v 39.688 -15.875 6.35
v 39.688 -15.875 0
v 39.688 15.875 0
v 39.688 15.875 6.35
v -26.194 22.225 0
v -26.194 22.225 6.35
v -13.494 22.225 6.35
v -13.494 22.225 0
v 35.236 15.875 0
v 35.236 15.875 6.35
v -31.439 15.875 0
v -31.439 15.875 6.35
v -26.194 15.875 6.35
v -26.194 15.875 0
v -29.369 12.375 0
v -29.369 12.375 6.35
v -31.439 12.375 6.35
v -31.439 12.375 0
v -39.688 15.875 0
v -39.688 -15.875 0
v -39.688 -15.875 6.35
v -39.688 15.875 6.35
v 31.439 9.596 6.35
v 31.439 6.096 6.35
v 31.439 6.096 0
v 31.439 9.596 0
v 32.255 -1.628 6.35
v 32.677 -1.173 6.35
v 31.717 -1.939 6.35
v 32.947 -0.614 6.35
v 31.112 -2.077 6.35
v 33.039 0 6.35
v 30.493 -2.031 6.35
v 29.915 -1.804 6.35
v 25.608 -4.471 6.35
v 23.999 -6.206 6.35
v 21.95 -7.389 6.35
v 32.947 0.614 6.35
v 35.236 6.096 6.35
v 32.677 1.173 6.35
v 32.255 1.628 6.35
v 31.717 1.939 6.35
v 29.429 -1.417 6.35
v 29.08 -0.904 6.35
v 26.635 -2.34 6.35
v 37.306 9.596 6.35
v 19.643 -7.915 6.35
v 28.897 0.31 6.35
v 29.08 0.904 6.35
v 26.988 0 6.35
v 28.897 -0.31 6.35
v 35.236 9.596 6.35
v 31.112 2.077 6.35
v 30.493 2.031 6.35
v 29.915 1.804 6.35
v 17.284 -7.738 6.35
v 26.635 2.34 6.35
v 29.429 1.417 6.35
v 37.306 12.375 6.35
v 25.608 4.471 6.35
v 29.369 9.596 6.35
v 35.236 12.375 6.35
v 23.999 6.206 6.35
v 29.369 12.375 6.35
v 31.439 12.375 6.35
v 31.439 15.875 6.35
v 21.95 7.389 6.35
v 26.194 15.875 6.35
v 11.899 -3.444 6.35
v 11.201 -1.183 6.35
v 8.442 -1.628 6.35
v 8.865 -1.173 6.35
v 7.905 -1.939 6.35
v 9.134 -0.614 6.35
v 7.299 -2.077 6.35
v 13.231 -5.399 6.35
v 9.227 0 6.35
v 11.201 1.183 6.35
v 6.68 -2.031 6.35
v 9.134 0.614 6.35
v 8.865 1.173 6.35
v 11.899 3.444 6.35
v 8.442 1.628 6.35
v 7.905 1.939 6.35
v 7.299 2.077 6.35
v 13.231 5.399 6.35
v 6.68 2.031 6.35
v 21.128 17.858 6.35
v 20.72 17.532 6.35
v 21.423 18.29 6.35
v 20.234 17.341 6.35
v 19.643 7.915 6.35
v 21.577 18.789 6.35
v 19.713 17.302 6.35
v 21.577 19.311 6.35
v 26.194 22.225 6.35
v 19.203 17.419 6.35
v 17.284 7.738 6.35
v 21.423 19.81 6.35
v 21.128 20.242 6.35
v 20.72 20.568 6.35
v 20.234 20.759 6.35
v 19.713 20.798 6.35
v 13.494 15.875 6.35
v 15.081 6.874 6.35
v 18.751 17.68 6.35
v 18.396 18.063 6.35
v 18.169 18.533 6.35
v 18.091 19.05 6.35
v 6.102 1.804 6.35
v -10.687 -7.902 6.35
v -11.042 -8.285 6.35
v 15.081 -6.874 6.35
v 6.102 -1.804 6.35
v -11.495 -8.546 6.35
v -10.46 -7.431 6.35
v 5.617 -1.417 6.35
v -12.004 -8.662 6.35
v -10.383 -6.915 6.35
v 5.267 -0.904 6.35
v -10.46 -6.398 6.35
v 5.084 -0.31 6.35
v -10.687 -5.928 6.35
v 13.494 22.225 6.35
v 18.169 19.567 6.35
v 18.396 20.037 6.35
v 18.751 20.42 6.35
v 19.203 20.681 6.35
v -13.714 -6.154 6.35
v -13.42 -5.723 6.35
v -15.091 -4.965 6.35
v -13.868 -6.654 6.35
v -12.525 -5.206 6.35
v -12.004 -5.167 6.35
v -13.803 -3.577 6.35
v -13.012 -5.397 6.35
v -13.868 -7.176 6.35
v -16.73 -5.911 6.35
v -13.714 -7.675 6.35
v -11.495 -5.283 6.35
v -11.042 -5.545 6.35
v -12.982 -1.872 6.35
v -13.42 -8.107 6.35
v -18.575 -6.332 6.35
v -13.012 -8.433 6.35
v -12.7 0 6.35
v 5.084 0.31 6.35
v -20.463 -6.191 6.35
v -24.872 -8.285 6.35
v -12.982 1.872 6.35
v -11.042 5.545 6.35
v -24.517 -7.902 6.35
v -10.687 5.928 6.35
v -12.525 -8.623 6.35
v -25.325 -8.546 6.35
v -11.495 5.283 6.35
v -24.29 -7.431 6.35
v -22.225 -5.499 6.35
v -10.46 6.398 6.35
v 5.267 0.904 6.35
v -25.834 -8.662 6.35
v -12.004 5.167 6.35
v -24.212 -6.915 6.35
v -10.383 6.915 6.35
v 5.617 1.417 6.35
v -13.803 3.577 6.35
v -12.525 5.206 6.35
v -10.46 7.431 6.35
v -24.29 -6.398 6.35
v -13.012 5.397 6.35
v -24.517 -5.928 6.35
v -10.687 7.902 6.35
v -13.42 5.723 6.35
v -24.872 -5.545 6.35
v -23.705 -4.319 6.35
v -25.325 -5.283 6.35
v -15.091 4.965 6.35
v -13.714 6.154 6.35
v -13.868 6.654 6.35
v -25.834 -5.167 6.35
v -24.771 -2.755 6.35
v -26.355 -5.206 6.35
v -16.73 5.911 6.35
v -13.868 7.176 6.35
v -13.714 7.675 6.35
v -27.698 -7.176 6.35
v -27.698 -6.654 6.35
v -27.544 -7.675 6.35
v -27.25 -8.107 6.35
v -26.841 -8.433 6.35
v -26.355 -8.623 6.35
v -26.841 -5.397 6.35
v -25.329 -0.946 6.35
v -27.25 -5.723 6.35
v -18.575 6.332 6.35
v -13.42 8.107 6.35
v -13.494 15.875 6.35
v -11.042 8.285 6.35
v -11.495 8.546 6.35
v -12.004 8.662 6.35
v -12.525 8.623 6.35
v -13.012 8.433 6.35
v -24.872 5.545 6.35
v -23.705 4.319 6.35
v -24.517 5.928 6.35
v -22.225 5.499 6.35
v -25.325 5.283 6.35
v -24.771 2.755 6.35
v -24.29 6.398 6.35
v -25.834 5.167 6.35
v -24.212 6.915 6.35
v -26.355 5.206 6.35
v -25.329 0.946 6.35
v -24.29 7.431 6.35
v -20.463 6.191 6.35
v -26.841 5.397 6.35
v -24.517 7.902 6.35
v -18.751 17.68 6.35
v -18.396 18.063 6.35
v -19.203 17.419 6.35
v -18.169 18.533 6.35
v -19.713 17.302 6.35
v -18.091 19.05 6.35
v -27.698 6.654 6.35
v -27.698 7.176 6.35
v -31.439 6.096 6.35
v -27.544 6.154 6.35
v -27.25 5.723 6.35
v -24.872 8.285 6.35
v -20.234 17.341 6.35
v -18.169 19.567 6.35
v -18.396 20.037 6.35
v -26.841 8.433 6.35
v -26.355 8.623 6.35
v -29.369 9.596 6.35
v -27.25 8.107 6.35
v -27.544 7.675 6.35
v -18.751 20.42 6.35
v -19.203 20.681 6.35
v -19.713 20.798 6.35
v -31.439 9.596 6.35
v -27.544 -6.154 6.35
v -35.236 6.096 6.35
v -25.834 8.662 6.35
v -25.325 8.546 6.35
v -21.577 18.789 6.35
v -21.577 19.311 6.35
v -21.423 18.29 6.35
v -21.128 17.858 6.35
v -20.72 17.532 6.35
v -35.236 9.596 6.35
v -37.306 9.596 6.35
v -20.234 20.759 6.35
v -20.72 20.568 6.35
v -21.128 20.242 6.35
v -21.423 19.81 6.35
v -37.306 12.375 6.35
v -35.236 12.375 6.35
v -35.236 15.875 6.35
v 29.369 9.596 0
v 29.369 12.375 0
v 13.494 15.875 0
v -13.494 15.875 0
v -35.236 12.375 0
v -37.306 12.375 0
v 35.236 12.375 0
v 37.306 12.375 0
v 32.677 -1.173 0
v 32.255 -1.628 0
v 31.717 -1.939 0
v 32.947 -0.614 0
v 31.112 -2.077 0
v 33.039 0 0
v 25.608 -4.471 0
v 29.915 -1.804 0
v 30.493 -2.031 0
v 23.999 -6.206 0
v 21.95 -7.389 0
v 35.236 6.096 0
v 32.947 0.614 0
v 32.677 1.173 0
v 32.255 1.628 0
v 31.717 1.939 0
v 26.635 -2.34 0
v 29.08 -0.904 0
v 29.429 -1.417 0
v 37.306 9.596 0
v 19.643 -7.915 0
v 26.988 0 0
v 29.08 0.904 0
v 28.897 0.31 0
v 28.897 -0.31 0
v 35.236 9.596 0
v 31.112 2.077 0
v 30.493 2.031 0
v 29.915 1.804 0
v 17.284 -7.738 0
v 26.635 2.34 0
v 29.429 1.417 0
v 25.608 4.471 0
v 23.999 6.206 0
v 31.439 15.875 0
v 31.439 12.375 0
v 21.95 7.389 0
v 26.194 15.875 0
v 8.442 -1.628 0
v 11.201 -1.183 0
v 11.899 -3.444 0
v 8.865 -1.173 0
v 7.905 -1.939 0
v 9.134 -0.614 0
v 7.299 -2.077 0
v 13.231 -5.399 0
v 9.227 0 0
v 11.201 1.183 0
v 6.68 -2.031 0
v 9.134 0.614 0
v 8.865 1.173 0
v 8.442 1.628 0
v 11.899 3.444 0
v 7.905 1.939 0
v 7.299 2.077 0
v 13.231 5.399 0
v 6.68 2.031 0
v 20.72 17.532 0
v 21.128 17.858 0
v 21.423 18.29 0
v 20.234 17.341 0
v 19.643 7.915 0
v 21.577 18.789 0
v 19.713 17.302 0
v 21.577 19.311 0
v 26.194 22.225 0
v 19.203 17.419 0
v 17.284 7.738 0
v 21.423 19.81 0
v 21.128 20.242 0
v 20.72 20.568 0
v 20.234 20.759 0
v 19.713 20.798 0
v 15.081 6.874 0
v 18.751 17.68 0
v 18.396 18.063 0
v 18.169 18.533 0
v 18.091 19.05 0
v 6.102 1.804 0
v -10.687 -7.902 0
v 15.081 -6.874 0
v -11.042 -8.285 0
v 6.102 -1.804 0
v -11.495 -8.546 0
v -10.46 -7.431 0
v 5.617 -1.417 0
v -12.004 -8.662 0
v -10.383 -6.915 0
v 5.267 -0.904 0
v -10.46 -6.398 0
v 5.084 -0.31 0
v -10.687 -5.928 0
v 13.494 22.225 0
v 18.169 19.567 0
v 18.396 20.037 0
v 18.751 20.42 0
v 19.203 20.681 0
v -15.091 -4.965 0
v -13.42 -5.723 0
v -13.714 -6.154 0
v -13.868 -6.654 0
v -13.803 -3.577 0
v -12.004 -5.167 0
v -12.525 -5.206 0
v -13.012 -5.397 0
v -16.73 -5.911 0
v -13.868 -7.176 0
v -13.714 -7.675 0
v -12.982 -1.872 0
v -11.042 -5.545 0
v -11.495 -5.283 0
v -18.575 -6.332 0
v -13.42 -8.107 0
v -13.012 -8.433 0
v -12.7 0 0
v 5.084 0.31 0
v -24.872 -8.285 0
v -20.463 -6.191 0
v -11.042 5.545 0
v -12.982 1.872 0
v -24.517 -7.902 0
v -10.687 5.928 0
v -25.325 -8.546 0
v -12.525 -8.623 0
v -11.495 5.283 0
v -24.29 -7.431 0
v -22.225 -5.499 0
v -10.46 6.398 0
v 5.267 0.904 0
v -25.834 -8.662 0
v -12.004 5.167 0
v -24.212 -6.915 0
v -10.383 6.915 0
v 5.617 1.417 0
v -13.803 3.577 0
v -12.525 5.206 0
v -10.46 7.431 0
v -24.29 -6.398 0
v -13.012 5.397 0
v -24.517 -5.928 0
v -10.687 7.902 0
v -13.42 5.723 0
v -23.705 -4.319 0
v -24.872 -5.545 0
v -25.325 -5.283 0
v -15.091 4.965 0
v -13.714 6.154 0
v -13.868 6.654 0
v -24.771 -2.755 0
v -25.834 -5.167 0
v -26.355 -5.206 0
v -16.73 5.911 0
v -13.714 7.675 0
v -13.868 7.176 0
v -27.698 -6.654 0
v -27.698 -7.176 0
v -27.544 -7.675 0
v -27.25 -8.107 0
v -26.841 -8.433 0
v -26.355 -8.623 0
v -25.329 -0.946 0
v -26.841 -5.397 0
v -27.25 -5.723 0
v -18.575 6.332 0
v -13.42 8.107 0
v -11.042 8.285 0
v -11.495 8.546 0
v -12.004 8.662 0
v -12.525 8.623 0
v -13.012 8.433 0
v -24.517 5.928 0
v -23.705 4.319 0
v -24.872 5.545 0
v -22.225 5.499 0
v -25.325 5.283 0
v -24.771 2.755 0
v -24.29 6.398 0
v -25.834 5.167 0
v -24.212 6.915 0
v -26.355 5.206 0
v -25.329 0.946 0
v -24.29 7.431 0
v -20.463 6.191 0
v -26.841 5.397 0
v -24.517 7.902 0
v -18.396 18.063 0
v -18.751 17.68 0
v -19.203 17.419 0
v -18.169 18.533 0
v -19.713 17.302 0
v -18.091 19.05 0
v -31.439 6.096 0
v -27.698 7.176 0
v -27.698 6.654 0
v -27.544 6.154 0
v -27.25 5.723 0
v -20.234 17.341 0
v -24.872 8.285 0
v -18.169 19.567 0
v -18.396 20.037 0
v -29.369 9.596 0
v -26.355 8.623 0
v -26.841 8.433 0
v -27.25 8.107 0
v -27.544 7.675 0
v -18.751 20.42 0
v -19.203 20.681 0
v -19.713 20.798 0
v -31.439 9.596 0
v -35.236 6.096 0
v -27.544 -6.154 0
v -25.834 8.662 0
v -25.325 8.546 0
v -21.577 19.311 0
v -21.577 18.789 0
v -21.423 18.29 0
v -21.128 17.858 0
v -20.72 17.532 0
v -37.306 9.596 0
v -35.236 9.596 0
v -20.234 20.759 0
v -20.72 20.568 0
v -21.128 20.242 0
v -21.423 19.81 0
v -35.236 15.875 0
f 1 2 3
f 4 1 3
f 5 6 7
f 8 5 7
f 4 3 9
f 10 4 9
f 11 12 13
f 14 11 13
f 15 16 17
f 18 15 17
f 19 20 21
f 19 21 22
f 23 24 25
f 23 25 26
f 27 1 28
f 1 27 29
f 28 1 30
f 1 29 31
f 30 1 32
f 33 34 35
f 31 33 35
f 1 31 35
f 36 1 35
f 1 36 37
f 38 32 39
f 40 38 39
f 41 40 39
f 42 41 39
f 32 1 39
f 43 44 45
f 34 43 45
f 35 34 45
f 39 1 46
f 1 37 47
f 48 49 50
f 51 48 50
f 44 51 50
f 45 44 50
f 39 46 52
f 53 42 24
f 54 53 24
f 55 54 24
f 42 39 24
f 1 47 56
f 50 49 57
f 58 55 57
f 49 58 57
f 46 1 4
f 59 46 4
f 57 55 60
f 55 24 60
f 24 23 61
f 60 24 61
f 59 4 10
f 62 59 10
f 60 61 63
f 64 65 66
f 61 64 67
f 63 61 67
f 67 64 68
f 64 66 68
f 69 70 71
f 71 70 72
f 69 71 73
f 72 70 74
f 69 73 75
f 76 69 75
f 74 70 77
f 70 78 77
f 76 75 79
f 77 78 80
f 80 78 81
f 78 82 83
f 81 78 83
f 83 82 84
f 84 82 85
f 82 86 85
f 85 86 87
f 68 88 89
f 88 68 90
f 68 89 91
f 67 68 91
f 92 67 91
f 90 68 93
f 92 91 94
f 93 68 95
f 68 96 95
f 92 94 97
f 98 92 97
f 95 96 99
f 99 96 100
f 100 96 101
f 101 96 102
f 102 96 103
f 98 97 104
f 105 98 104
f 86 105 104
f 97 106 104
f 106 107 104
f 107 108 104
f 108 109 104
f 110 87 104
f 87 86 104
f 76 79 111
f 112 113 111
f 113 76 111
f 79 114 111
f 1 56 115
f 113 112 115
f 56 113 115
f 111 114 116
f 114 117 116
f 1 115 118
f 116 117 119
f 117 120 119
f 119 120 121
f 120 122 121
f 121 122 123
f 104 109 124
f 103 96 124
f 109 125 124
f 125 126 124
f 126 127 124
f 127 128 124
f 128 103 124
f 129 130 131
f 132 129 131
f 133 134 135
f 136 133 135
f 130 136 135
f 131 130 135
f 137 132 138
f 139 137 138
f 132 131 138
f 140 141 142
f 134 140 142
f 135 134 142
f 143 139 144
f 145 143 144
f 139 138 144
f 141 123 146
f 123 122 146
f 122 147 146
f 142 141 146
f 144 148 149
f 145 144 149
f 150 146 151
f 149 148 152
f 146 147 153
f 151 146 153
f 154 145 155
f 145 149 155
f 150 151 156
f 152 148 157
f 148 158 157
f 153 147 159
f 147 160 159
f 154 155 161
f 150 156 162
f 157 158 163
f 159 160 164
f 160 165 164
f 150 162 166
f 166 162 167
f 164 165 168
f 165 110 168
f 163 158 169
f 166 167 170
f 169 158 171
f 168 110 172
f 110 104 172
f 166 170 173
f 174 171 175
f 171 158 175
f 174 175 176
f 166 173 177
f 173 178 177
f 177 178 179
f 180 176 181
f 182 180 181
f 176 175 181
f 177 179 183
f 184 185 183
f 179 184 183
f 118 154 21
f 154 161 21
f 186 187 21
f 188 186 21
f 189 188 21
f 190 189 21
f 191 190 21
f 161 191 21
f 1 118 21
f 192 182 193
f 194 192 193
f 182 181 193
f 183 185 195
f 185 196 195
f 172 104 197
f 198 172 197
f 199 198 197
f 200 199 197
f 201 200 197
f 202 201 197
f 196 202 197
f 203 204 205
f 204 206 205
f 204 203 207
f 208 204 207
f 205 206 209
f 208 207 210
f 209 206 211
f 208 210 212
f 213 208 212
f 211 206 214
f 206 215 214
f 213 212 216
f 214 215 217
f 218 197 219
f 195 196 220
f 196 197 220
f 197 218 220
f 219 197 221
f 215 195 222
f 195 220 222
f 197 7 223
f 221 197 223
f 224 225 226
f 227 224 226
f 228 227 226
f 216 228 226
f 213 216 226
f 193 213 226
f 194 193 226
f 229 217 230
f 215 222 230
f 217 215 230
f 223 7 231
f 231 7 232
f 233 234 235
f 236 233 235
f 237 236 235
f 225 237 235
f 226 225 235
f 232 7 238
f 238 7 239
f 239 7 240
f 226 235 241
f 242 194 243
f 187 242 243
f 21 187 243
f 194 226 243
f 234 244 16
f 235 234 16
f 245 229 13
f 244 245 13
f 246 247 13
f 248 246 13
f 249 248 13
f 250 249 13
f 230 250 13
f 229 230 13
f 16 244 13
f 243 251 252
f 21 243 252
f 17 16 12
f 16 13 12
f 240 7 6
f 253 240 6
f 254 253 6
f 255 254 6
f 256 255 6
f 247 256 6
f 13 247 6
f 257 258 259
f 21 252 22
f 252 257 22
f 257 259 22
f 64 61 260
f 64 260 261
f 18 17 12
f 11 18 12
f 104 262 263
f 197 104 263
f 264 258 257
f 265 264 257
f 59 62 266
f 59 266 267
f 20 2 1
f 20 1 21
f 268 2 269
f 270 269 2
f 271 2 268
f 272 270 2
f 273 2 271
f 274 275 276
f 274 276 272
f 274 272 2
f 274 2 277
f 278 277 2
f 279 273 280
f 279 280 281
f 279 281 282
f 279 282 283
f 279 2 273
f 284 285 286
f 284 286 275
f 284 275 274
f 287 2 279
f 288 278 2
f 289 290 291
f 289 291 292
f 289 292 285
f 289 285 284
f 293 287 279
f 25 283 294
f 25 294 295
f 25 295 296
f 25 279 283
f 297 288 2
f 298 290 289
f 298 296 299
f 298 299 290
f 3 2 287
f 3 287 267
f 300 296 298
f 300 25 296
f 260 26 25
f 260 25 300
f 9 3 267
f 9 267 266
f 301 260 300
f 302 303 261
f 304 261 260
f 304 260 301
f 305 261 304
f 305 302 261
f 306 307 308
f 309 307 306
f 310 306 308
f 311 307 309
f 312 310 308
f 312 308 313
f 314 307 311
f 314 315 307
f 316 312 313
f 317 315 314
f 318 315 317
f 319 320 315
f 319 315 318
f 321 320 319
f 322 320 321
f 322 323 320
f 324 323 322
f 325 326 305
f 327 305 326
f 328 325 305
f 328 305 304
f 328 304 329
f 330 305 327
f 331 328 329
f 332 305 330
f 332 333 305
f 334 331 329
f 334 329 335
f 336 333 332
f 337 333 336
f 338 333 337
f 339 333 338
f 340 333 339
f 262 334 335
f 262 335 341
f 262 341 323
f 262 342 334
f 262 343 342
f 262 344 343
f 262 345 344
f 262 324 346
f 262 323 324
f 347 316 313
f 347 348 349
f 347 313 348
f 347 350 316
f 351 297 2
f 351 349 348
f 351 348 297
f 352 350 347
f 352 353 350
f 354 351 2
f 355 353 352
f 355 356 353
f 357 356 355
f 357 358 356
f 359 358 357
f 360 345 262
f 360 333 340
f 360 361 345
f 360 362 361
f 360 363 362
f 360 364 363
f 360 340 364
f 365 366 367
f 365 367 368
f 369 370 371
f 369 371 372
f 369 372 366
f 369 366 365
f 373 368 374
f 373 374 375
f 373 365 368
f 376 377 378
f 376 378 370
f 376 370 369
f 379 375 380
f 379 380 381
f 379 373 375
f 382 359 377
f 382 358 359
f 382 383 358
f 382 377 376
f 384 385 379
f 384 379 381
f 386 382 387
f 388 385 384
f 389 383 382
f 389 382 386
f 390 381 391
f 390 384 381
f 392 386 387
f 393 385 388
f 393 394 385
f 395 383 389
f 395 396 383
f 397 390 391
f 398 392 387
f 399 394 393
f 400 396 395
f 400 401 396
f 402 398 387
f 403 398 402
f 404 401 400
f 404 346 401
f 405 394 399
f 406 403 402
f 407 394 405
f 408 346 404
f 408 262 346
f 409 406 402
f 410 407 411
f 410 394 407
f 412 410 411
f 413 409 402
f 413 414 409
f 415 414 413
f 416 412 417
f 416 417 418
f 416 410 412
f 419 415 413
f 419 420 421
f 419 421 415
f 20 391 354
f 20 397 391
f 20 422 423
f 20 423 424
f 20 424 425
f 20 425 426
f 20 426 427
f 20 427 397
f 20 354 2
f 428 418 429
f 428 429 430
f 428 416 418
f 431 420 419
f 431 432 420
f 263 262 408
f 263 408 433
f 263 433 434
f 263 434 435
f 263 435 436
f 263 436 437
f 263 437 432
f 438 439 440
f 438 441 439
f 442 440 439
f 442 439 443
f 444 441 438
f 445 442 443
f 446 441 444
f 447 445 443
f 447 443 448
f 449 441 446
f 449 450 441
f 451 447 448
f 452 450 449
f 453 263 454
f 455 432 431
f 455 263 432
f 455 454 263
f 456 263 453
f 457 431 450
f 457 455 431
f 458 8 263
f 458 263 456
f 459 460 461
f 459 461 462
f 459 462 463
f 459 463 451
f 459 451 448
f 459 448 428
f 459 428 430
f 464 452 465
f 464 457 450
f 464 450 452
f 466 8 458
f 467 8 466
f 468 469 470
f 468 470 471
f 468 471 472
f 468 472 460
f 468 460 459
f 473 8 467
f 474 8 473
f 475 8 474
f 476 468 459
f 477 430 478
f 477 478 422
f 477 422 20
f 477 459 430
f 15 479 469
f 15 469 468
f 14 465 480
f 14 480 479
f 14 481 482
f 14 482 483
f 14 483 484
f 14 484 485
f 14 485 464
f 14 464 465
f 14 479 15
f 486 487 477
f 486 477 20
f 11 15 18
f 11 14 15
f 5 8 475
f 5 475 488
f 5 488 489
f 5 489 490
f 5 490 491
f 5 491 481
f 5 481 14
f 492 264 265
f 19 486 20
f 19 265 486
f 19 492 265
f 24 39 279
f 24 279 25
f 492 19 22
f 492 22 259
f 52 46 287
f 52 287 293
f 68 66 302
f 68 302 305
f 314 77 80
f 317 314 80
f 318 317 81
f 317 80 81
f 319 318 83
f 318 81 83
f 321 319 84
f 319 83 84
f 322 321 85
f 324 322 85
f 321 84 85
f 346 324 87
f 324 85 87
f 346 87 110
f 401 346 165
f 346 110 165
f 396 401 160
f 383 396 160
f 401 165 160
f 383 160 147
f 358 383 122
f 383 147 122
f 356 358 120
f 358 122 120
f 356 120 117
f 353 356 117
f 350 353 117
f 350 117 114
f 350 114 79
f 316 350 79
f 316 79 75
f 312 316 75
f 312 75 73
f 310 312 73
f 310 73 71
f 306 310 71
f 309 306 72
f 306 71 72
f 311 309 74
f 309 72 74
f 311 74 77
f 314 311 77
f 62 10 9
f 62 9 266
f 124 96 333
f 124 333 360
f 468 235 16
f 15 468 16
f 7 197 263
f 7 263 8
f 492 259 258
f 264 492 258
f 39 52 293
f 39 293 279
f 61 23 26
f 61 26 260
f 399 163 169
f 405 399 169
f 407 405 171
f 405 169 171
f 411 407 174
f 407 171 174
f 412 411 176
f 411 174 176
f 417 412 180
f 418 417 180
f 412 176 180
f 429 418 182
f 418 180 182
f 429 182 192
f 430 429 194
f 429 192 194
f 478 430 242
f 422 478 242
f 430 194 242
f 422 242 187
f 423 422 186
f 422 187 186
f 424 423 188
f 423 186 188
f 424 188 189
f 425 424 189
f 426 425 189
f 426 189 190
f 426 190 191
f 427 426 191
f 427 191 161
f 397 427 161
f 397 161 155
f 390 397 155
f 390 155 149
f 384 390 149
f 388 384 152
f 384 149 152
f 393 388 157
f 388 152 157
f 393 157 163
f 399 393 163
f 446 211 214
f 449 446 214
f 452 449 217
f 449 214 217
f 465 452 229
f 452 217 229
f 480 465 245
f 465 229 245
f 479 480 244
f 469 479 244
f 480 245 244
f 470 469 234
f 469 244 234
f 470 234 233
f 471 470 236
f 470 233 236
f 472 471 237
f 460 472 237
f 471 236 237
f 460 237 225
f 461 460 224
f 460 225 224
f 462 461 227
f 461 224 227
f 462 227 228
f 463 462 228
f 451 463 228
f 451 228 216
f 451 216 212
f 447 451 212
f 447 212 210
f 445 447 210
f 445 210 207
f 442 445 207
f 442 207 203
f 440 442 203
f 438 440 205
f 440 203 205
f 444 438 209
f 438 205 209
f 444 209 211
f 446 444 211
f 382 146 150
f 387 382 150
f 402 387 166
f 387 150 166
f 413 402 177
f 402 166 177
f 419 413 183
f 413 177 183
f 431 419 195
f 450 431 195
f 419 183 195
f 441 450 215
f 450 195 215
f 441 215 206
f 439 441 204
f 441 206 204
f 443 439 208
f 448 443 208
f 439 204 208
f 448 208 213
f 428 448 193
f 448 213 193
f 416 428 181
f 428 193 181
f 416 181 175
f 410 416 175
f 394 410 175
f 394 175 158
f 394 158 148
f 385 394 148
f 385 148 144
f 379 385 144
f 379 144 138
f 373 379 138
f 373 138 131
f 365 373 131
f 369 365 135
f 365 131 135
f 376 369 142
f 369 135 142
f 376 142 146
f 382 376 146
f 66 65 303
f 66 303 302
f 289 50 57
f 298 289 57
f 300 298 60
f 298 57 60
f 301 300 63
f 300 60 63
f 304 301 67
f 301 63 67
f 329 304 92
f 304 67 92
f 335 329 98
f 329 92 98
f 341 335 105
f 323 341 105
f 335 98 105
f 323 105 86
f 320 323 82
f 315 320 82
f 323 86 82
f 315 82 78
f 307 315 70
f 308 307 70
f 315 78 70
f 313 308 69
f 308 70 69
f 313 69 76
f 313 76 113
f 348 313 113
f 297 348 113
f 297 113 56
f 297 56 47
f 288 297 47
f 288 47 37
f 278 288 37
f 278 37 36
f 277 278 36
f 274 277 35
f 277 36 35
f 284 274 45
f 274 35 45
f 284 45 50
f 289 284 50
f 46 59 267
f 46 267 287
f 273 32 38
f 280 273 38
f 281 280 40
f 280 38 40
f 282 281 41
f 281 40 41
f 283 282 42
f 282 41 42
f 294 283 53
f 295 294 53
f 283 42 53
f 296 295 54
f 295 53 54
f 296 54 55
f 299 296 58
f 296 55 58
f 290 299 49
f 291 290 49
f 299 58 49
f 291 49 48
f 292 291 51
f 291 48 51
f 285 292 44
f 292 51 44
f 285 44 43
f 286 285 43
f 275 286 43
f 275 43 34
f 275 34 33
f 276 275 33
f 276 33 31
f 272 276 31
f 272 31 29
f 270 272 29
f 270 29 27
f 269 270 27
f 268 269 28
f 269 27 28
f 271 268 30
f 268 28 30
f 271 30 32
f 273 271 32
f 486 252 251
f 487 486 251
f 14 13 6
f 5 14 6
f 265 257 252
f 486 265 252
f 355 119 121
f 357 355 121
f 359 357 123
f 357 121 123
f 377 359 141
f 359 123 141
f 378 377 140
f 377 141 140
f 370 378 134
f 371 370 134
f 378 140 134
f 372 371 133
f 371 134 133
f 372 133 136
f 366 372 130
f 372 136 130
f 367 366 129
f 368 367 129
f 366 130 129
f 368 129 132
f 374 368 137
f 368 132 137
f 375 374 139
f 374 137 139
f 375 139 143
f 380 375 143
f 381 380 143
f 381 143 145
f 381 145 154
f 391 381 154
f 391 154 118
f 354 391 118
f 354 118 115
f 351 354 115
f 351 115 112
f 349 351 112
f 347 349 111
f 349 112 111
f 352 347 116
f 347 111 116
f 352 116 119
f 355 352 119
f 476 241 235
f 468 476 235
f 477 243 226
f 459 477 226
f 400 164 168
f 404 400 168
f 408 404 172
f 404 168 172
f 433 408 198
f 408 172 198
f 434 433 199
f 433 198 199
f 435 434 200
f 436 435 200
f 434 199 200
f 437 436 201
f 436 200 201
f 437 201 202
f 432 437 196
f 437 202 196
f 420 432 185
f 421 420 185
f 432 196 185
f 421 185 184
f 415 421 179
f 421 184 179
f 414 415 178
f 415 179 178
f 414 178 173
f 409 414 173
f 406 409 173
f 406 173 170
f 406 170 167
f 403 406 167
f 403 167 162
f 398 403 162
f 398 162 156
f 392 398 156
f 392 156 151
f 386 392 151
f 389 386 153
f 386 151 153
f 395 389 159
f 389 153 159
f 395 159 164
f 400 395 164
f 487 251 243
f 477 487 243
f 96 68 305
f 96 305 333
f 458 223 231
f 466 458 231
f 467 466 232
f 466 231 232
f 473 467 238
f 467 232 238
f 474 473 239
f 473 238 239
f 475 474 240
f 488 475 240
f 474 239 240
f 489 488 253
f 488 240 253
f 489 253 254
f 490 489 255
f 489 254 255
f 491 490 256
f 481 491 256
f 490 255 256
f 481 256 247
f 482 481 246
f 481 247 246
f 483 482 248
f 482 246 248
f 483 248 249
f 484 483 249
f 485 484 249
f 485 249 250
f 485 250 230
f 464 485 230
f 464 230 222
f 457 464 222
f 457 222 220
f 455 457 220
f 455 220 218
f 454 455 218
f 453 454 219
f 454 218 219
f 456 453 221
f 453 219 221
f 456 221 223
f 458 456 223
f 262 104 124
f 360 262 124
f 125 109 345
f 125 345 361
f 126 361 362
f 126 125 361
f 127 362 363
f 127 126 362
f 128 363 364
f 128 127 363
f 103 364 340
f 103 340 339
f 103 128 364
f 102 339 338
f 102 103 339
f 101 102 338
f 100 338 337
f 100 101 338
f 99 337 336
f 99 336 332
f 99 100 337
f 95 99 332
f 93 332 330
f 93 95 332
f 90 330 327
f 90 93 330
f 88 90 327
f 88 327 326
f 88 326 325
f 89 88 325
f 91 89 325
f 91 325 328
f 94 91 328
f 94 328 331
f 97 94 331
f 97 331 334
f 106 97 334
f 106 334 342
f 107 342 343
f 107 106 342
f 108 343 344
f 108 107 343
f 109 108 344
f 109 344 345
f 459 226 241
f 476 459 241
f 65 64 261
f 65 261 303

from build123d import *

# Parameters (mm, degrees)
SKETCH1_W           = 39.6875
SKETCH1_H           = 31.75
BOSS_EXTRUDE1_DEPTH = 6.35
SKETCH2_R           = 6.35
SKETCH2_R_2         = 1.7526
CUT_EXTRUDE1_DEPTH  = 6.35
CUT_EXTRUDE4_DEPTH  = 6.35
SKETCH4_W           = 12.7
SKETCH4_H           = 6.35
SKETCH4_R           = 1.7526
BOSS_EXTRUDE2_DEPTH = 6.35
SKETCH5_R           = 7.9375
SKETCH5_R_2         = 2.0828
CUT_EXTRUDE3_DEPTH  = 6.35


with BuildPart() as part:
    # Sketch1 → Boss-Extrude1 (new body)
    with BuildSketch(Plane.XY):
        with Locations((-19.84375, 0)):
            Rectangle(SKETCH1_W, SKETCH1_H)
    boss_extrude1 = extrude(amount=BOSS_EXTRUDE1_DEPTH)

    # Sketch2 → Cut-Extrude1 (cut)
    with BuildSketch(Plane.XY.offset(6.35)):
        with Locations((-19.05, 0)):
            Circle(SKETCH2_R)
        with Locations((-25.964797213, 6.914797213)):
            Circle(SKETCH2_R_2)
        with Locations((-12.135202787, 6.914797213)):
            Circle(SKETCH2_R_2)
        with Locations((-12.135202787, -6.914797213)):
            Circle(SKETCH2_R_2)
        with Locations((-25.964797213, -6.914797213)):
            Circle(SKETCH2_R_2)
    extrude(amount=-CUT_EXTRUDE1_DEPTH, mode=Mode.SUBTRACT)

    # Sketch3 → Cut-Extrude4 (cut)
    with BuildSketch(Plane.XY.offset(6.35)):
        Polygon((-35.23615, 6.096), (-31.43885, 6.096), (-31.43885, 9.5964375), (-29.36875, 9.5964375), (-29.36875, 12.3745625), (-31.43885, 12.3745625), (-31.43885, 15.875), (-35.23615, 15.875), (-35.23615, 12.3745625), (-37.30625, 12.3745625), (-37.30625, 9.5964375), (-35.23615, 9.5964375), align=None)
    cut_extrude4 = extrude(amount=-CUT_EXTRUDE4_DEPTH, mode=Mode.SUBTRACT)

    # Sketch4 → Boss-Extrude2 (add)
    with BuildSketch(Plane.XY.offset(6.35)):
        with Locations((-19.84375, 19.05)):
            Rectangle(SKETCH4_W, SKETCH4_H)
        with Locations((-19.84375, 19.05)):
            Circle(SKETCH4_R, mode=Mode.SUBTRACT)
    boss_extrude2 = extrude(amount=-BOSS_EXTRUDE2_DEPTH)

    # Mirror1: Boss-Extrude1, Cut-Extrude4, Boss-Extrude2 across plane
    add(boss_extrude1.mirror(Plane(origin=(0, -15.875, 6.35), x_dir=(0, 0, 1), z_dir=(-1, 0, 0))))
    add(cut_extrude4.mirror(Plane(origin=(0, -15.875, 6.35), x_dir=(0, 0, 1), z_dir=(-1, 0, 0))), mode=Mode.SUBTRACT)
    add(boss_extrude2.mirror(Plane(origin=(0, -15.875, 6.35), x_dir=(0, 0, 1), z_dir=(-1, 0, 0))))

    # Sketch5 → Cut-Extrude3 (cut)
    with BuildSketch(Plane.XY.offset(6.35)):
        with Locations((19.05, 0)):
            Circle(SKETCH5_R)
        with Locations((7.14375, 0)):
            Circle(SKETCH5_R_2)
        with Locations((30.95625, 0)):
            Circle(SKETCH5_R_2)
    extrude(amount=-CUT_EXTRUDE3_DEPTH, mode=Mode.SUBTRACT)


solid = part.part
